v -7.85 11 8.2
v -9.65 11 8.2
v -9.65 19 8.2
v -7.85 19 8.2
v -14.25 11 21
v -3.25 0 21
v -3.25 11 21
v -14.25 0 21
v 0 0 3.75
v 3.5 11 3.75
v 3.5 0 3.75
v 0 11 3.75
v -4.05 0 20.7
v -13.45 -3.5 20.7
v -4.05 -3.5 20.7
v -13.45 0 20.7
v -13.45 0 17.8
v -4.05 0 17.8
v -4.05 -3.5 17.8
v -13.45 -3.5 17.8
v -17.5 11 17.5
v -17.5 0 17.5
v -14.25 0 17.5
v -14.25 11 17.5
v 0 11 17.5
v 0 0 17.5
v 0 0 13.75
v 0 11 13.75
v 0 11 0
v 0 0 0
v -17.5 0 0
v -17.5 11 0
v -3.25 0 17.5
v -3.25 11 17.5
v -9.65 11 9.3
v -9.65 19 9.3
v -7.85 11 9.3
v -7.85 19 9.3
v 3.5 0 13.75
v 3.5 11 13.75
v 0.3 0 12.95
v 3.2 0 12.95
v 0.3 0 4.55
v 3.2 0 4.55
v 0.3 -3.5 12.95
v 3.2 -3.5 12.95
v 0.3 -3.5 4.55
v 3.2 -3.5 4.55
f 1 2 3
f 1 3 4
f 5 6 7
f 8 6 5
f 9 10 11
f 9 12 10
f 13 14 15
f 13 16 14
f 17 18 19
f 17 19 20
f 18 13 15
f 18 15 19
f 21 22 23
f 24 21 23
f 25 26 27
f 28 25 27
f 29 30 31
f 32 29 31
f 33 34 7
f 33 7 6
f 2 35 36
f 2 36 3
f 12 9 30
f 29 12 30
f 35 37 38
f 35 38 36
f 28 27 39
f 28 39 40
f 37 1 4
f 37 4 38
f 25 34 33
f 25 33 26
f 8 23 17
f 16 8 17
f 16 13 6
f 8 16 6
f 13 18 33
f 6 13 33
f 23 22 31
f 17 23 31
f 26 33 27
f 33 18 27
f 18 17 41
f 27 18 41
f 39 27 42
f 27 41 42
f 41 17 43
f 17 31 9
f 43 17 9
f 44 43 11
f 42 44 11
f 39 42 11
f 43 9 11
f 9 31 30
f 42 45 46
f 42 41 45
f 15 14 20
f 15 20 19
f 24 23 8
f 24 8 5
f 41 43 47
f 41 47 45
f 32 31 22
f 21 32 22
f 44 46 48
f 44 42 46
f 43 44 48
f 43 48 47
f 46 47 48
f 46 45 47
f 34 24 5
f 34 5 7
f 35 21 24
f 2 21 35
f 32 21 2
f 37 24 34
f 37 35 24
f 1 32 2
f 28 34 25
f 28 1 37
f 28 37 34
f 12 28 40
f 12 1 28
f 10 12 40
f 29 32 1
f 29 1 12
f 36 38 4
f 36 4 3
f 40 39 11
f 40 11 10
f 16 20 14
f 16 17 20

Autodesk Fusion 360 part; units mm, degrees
sketch "Sketch1" plane through (0, 0, 0) normal (0, 1, 0) x (1, 0, 0)
  line L0 (0, 0) -> (-17.5, 0)
  line L1 (-17.5, 0) -> (-17.5, -17.5)
  line L2 (-17.5, -17.5) -> (0, -17.5)
  line L3 (0, -17.5) -> (0, 0)
  dimension "d1" = 17.5
  dimension "d2" = 17.5
extrude "Extrude1" add sketch "Sketch1" along normal blind 11
sketch "Sketch2" plane through (0, 11, 0) normal (0, 1, 0) x (-1, 0, 0)
  line L0 (0, 17.5) -> (0, 0)
  line L1 (0, 0) -> (17.5, 0)
  line L2 (17.5, 0) -> (17.5, 17.5)
  line L3 (17.5, 17.5) -> (0, 17.5)
  line L4 (7.85, 9.3) -> (9.65, 9.3)
  line L5 (9.65, 9.3) -> (9.65, 8.2)
  line L6 (9.65, 8.2) -> (7.85, 8.2)
  line L7 (7.85, 8.2) -> (7.85, 9.3)
  line L8 (8.75, 9.3) -> (8.75, 8.2)
  line L9 (9.65, 8.75) -> (7.85, 8.75)
  line L10 (0, 17.5) -> (17.5, 17.5)
  line L11 (0, 17.5) -> (0, 0)
  line L12 (8.75, 17.5) -> (8.75, 0)
  line L13 (0, 8.75) -> (17.5, 8.75)
  dimension "d5" = 1.8
  dimension "d6" = 1.1
extrude "Extrude2" add sketch "Sketch2" along normal blind 8 contours L6 L7 L8 L9 L12 L13 | L4 L7 L8 L9 L12 L13 | L4 L5 L8 L9 L12 L13 | L5 L6 L8 L9 L12 L13
sketch "Sketch3" plane through (0, 0, 0) normal (1, 0, 0) x (0, 1, 0)
  line L0 (0, 17.5) -> (0, 0)
  line L1 (0, 0) -> (11, 0)
  line L2 (11, 0) -> (11, 17.5)
  line L3 (11, 17.5) -> (0, 17.5)
  line L4 (0, 13.75) -> (11, 13.75)
  line L5 (11, 13.75) -> (11, 3.75)
  line L6 (11, 3.75) -> (0, 3.75)
  line L7 (0, 3.75) -> (0, 13.75)
  line L8 (11, 8.75) -> (0, 8.75)
  line L9 (11, 17.5) -> (11, 0)
  line L10 (11, 8.75) -> (0, 8.75)
  dimension "d11" = 10
  dimension "d12" = 11
extrude "Extrude3" add sketch "Sketch3" along normal blind 3.5 contours L0 L2 L4 L5 L7 L8 L9 L10 | L0 L2 L5 L6 L7 L8 L9 L10
sketch "Sketch4" plane through (0, 0, 17.5) normal (0, 0, 1) x (-1, 0, 0)
  line L0 (17.5, 0) -> (0, 0)
  line L1 (0, 0) -> (0, -11)
  line L2 (0, -11) -> (17.5, -11)
  line L3 (17.5, -11) -> (17.5, 0)
  line L4 (14.25, -11) -> (3.25, -11)
  line L5 (3.25, -11) -> (3.25, 0)
  line L6 (3.25, 0) -> (14.25, 0)
  line L7 (14.25, 0) -> (14.25, -11)
  line L8 (8.75, -11) -> (8.75, 0)
  line L9 (17.5, -11) -> (0, -11)
  line L10 (8.75, -11) -> (8.75, 0)
  dimension "d18" = 11
extrude "Extrude4" add sketch "Sketch4" along normal blind 3.5 contours L0 L2 L4 L6 L7 L8 L9 L10 | L0 L2 L4 L5 L6 L8 L9 L10
sketch "Sketch5" plane through (0, 0, 0) normal (0, -1, 0) x (1, 0, 0)
  line L0 (0, 13.75) -> (0, 17.5)
  line L1 (0, 17.5) -> (-3.25, 17.5)
  line L2 (-3.25, 17.5) -> (-3.25, 21)
  line L3 (-3.25, 21) -> (-14.25, 21)
  line L4 (-14.25, 21) -> (-14.25, 17.5)
  line L5 (-14.25, 17.5) -> (-17.5, 17.5)
  line L6 (-17.5, 17.5) -> (-17.5, 0)
  line L7 (-17.5, 0) -> (0, 0)
  line L8 (0, 0) -> (0, 3.75)
  line L9 (0, 3.75) -> (3.5, 3.75)
  line L10 (3.5, 3.75) -> (3.5, 13.75)
  line L11 (3.5, 13.75) -> (0, 13.75)
  line L12 (-13.45, 20.7) -> (-4.05, 20.7)
  line L13 (-4.05, 20.7) -> (-4.05, 17.8)
  line L14 (-4.05, 17.8) -> (-13.45, 17.8)
  line L15 (-13.45, 17.8) -> (-13.45, 20.7)
  line L16 (0.3, 12.95) -> (3.2, 12.95)
  line L17 (3.2, 12.95) -> (3.2, 4.55)
  line L18 (3.2, 4.55) -> (0.3, 4.55)
  line L19 (0.3, 4.55) -> (0.3, 12.95)
  line L20 (0, 17.5) -> (0, 0)
  line L21 (-17.5, 17.5) -> (0, 17.5)
  dimension "d21" = 0.8
  dimension "d22" = 0.8
  dimension "d23" = 0.8
  dimension "d24" = 0.8
  dimension "d25" = 0.3
  dimension "d27" = 0.3
  dimension "d28" = 0.3
  dimension "d29" = 0.3
extrude "Extrude5" add sketch "Sketch5" along normal blind 3.5 contours L12 L13 L14 L15 | L16 L17 L18 L19
equation "d21 = d23"
equation "d22 = d23"
equation "d24 = d23"
equation "d27 = d25"
equation "d28 = d25"
equation "d29 = d25"
